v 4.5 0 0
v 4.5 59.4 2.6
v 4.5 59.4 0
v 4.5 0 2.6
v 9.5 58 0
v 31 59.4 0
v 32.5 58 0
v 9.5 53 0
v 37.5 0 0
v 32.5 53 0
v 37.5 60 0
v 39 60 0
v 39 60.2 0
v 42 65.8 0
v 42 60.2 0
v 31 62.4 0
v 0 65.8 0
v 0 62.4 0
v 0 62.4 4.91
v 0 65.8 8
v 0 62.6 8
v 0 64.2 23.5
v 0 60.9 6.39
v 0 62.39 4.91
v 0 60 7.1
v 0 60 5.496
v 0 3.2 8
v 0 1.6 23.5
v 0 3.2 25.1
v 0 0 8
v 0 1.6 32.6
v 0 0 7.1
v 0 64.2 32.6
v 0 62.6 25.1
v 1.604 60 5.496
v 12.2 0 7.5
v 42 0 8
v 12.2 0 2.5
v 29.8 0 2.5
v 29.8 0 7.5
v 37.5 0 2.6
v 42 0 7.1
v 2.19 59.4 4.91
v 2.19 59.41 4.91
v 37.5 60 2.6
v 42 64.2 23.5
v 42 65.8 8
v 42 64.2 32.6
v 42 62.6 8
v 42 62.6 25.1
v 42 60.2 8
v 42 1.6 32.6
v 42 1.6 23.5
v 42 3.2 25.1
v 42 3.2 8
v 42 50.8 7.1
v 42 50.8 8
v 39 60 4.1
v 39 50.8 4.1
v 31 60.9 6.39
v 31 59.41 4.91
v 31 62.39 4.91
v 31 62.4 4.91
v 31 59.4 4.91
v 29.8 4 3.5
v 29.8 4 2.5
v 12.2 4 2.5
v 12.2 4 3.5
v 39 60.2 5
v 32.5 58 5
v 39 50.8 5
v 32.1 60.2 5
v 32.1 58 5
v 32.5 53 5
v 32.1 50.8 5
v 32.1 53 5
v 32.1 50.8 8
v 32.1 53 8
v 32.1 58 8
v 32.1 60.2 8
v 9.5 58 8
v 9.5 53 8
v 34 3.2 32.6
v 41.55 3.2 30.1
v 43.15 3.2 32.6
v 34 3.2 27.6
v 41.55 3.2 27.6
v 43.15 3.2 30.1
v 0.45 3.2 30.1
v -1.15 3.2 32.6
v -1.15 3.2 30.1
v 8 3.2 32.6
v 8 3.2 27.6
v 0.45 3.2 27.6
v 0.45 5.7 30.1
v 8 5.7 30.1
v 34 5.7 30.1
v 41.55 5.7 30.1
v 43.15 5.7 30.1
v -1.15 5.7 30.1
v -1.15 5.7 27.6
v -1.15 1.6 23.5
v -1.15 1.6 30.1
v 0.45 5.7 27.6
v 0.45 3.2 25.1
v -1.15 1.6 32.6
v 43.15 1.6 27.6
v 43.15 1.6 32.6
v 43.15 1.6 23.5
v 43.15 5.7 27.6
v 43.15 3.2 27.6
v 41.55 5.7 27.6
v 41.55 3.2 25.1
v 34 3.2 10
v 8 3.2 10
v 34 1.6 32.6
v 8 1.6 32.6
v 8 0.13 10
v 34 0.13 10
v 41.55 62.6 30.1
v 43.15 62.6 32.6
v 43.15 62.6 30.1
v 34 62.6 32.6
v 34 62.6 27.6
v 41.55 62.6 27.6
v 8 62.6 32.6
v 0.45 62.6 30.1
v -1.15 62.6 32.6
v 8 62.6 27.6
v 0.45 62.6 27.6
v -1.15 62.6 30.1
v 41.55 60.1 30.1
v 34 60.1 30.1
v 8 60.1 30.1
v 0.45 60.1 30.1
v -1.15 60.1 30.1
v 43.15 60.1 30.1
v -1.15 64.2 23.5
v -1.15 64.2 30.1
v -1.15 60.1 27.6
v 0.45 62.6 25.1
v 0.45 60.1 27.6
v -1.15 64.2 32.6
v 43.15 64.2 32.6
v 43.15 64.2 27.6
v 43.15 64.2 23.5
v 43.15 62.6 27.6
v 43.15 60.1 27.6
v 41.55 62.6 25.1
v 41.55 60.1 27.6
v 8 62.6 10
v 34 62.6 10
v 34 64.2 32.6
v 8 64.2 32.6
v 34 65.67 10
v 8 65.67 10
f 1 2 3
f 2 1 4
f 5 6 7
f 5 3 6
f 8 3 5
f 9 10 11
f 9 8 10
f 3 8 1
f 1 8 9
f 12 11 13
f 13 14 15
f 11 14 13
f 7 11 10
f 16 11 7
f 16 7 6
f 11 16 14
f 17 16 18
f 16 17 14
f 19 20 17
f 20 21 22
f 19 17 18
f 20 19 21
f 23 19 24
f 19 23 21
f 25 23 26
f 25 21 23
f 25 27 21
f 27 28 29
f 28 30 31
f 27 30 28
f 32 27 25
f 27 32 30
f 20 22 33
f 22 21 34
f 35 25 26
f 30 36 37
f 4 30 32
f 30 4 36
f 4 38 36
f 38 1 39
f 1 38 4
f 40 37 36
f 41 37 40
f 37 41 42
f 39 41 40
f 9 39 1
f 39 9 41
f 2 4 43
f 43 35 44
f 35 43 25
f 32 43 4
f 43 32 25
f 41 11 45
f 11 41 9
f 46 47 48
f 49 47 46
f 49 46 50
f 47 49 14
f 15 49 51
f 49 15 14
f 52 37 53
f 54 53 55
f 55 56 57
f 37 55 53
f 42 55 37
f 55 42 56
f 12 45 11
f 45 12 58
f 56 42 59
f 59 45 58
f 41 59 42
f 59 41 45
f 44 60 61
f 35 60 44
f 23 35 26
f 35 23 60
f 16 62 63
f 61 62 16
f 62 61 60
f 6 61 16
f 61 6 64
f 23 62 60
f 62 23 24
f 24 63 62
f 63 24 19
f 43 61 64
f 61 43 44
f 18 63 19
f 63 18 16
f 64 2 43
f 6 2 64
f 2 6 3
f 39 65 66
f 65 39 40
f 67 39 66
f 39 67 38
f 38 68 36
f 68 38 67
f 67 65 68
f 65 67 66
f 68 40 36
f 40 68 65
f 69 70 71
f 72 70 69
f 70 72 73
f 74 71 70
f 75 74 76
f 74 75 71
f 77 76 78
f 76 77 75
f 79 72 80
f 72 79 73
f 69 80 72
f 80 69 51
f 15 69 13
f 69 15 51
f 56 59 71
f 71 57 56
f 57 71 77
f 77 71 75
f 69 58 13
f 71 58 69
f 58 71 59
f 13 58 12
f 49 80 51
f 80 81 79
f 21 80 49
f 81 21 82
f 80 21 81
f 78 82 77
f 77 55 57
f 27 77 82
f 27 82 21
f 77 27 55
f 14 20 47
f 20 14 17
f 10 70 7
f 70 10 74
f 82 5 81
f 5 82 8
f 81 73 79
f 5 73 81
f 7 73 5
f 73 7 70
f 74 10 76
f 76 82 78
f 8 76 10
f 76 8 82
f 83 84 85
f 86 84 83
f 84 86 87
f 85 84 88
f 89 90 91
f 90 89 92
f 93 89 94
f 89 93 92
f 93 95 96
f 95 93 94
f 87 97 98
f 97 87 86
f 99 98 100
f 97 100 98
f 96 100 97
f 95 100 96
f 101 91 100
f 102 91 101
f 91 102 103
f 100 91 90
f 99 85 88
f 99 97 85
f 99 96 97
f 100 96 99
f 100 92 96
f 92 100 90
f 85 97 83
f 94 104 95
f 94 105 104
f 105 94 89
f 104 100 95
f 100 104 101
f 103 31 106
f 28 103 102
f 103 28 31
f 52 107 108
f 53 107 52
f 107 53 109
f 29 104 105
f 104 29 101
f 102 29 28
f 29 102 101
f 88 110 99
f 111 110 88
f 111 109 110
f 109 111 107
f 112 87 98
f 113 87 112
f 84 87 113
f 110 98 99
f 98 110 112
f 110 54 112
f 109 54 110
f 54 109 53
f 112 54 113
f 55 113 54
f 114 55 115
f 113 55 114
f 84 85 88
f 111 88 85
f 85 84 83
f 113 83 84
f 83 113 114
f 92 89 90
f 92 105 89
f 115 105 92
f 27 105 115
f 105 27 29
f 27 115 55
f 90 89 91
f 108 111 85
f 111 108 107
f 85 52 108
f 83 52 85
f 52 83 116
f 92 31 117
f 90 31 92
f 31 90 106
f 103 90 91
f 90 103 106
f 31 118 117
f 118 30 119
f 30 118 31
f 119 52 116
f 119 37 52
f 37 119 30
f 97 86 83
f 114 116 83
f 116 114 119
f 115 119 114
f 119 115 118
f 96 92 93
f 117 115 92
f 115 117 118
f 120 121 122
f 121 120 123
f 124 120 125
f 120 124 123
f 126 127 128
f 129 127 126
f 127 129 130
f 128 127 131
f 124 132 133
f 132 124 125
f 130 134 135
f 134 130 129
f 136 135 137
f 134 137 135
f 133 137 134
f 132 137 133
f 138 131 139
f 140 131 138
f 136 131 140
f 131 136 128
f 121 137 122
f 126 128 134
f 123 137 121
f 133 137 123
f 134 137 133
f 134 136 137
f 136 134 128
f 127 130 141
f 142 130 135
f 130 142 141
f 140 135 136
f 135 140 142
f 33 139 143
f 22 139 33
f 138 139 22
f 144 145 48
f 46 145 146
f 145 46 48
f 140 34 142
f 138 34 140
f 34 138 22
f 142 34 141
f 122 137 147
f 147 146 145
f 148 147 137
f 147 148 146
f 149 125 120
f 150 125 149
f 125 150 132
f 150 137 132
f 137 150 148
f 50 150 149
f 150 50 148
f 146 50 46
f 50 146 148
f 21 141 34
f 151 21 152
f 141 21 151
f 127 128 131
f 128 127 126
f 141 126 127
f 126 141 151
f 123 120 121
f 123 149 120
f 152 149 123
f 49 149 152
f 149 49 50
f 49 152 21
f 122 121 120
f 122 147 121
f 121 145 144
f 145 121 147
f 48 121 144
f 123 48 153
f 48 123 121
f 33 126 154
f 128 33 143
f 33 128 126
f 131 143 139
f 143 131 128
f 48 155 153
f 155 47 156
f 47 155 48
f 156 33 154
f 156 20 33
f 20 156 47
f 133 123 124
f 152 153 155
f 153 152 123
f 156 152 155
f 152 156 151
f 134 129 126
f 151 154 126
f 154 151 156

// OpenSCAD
/*
Generic Action Camera Adapter for 3DR Solo
Copyright (C) 2016 - 2017  Hugh Eaves

This program is free software: you can redistribute it and/or modify
it under the terms of the GNU General Public License as published by
the Free Software Foundation, either version 3 of the License, or
(at your option) any later version.

This program is distributed in the hope that it will be useful,
but WITHOUT ANY WARRANTY; without even the implied warranty of
MERCHANTABILITY or FITNESS FOR A PARTICULAR PURPOSE.  See the
GNU General Public License for more details.

You should have received a copy of the GNU General Public License
along with this program.  If not, see <http://www.gnu.org/licenses/>.
*/

/************************************************
 * PART SELECTION
 ************************************************/

// Select the part you would like to display
part = "adapter"; // [adapter:Adapter,retaining_clip:Retaining clip,back_weight:Back Weight,side_weight:Side Weight]

/********************
 * MAIN PARAMETERS *
 ********************/

// No-name SJ4000 clone
// camera_length = 59.8;
// camera_width = 40.8;
// camera_height = 25.6;

// The values below are for the GitUp Git2P

/* [Adapter Parameters] */
// Length of camera body (side to side)
camera_length = 59.4; // [57:62]
// Width of camera body (top to bottom)
camera_width = 41.1; // [38:42]
// Height of camera body (front to back)
camera_height = 19.6; // [15:40]

// Adapter arm bump size (How far out the "bumps" protrude on the ends of the arms)
adapter_arm_bump_size = 2.5; // [1:5]

/* [Back Weight Parameters] */
// The length of the counterbalance weight on the back of the camera. Larger values make it heavier.
back_weight_length = 29; // [10:40]

// The offset of the weight on the back of the gimbal. Values greater than zero move the weight to the outer side of the gimbal
back_weight_offset = 0; // [0:20]

/* [Side Weight Parameters] */
// The thickness of the side weight, thicker is heavier
side_weight_thickness = 4; // [4:8]

// The length of the side weight, longer is heavier
side_weight_length = 10; // [9:17]

/********************
 * OTHER PARAMETERS *
 ********************/
/* [Hidden] */

/* How much to shift the camera to the right to avoid the curved protrusion from the pitch motor housing */
camera_offset = 3.2;

/* Dimensions of the base of the camera adapter, so that it is a nice snug fit inside the 3DR gimbal mount */
base_height = 8; // (thickness) thick enough to clear the GoPro plug in the back
base_width = 42;
base_length = 60;

/* Dimensions of the small bracket that holds the camera adapter to the gimbal mount */
bracket_width = 9;
bracket_depth = 9.5;
bracket_thickness = 3;
bracket_radius = 2;

/* Typical values for M2 cap-head screws */
screw_thread_diameter = 2.5;
screw_head_diameter = 5;
screw_head_height = 3;

/* Dimensions of the "stud" that the 3DR balancing weights attach to */
stud_height = 2.5;
stud_diameter = 6.4;
stud_hole_diameter = 2;

bottom_lip_width = 4.5;
bottom_lip_height = 2.6;

// cutout for GoPro plug
plug_thickness = 5;
plug_width = 23;
plug_offset = 55.5 - (plug_thickness / 2);

// cutout for right side wall of "gimbal bracket"
side_wall_length = 31;
side_wall_height = 6.4;
side_wall_width = 3;
side_wall_offset = 59.4;

// height of hook on bottom left of "gimbal bracket"
hook_width = 17.6;
hook_height = 2.5; // distance from bottom
hook_length = 4;
hook_thickness = 1;

// width of protrusion on front of "pitch motor"
motor_protrusion_width = 20;

// thickness / length of camera retaining clips
clip_thickness = 1.6;
right_clip_opening_width = 26;
// left_clip_opening_width = motor_protrusion_width;
left_clip_opening_width = right_clip_opening_width;

x_midpoint = base_width / 2;
main_length = camera_length + camera_offset * 2;
camera_gap = (base_width - camera_width) / 2;

camera_height_adjustment = 0;

// more facets for smaller holes
$fn = 16;

module lip_cutout() {
  cube([bottom_lip_width, base_length, bottom_lip_height]);
  translate([0, 0, bottom_lip_height])
    mirror([1, -1, 0])
      wedge(base_length, bottom_lip_width, bottom_lip_width, false, false);
}


module side_wall_cutout() {
  translate([0, side_wall_offset, 0]) {
    cutout_base_height = side_wall_height - (side_wall_width / 2);
    cube([side_wall_length, side_wall_width, cutout_base_height + 0.01]);
    translate([0, 0, cutout_base_height])
      prism(side_wall_length, side_wall_width, side_wall_width / 2 - 0.01);
  }
}

module hook_cutout() {
  translate([x_midpoint - hook_width / 2, 0, hook_height]) {
    cube([hook_width, hook_length, hook_thickness]);
    translate([0, 0, hook_thickness])
      wedge(hook_width, hook_length, hook_length, false);
  }
}

module bracket_cutout() {
  bracket_clearance = 0.4;
  adj_bracket_width = bracket_width + bracket_clearance;
  adj_bracket_depth = bracket_depth + bracket_clearance;
  translate([base_width - bracket_depth, base_length + bracket_clearance / 2 - adj_bracket_width, 0]) {
    translate([-bracket_clearance, 0, base_height - bracket_thickness])
      cube([adj_bracket_depth, adj_bracket_width, bracket_thickness + 5]);
    translate([bracket_depth - bracket_thickness, 0, 0])
      cube([bracket_depth, adj_bracket_width, base_height]);
  }

}

module clip_corner(length) {

  cube([clip_thickness, length + clip_thickness, length]);
  wedge(clip_thickness, length + clip_thickness, length + clip_thickness, false, true);

}


module clip(length) {
  cube([base_width, clip_thickness, camera_height]);
  translate([-clip_thickness + camera_gap, 0, camera_height])
    cube([camera_width + clip_thickness * 2, clip_thickness, length * 2 + camera_height_adjustment]);
  translate([-clip_thickness + camera_gap, clip_thickness, camera_height + camera_height_adjustment])
    mirror([0, 1, -1])
      prism(camera_width + clip_thickness * 2, length * 2, length);
  //   cube([camera_width+clip_thickness*2, length + clip_thickness, clip_thickness ]);
  wedge(base_width, camera_offset - clip_thickness, camera_height + length * 2 + camera_height_adjustment, true, false);
  translate([0, 0, camera_height + adapter_arm_bump_size + camera_height_adjustment - length]) {
    translate([-clip_thickness + camera_gap, 0, 0])
      clip_corner(length);
    translate([base_width - camera_gap, 0, 0])
      clip_corner(length);
  }
}

module left_clip() {
  translate([0, camera_offset - clip_thickness, base_height]) {
    difference() {
      clip(adapter_arm_bump_size);
      translate([x_midpoint - left_clip_opening_width / 2, -clip_thickness, 2])
        cube([left_clip_opening_width, adapter_arm_bump_size + clip_thickness * 2, camera_height + adapter_arm_bump_size * 2]);
    }
  }
}

module right_clip() {
  translate([0, camera_length + camera_offset + clip_thickness, base_height]) {
    mirror([0, 1, 0])
      difference() {
        clip(adapter_arm_bump_size);
        translate([x_midpoint - right_clip_opening_width / 2, -clip_thickness, 2])
          cube([right_clip_opening_width, adapter_arm_bump_size + clip_thickness * 2, camera_height + adapter_arm_bump_size * 2]);
      }
  }
}

module prism(x, y, z, upside_down) {
  translate([0, y / 2, 0]) {
    wedge(x, y / 2, z, true, upside_down);
    wedge(x, y / 2, z, false, upside_down);
  }
}

module wedge(x, y, z, reverse, upside_down) {
  ly = reverse ? -y : y;
  lz = upside_down ? -z : z;
  polyhedron(points = [
    [0, 0, 0],
    [x, 0, 0],
    [x, ly, 0],
    [0, ly, 0],
    [0, 0, lz],
    [x, 0, lz]
  ], faces = [
    [0, 1, 2, 3],
    [5, 4, 3, 2],
    [0, 4, 5, 1],
    [0, 3, 4],
    [5, 2, 1]
  ]);
}

module weight_stud() {
  difference() {
    cylinder(d = stud_diameter - 0.4, h = stud_height, $fn = 32);
    cylinder(d = stud_hole_diameter, h = stud_height, $fn = 16);
  }
}


/********************************************
 * Top level function to render the adapter
 ********************************************/
module adapter() {

  difference() {
    cube([base_width, main_length, base_height]);

    lip_cutout();

    translate([base_width, 0, 0])
      mirror([-1, 0, 0])
        lip_cutout();

    side_wall_cutout();

    translate([x_midpoint - plug_width / 2, plug_offset, 0])
      cube([plug_width, plug_thickness, base_height]);

    hook_cutout();

    bracket_cutout();
  }

  left_clip();
  right_clip();

}

/********************************************
 * Top level function to render the retaining clip
 ********************************************/
module retaining_clip() {
  bracket_inside_height = 11.4 + base_height - bracket_thickness;

  difference() {
    union() {
      hull() {
        cube([bracket_width, bracket_thickness, bracket_depth + bracket_thickness - bracket_radius]);
        cube([1, bracket_thickness, bracket_depth + bracket_thickness]);
        translate([bracket_width - bracket_radius, 0, bracket_depth + bracket_thickness - bracket_radius])
          mirror([0, -1, 1])
            cylinder(r = bracket_radius, h = bracket_thickness);
      }
      translate([0, bracket_inside_height + bracket_thickness, 0])
        cube([bracket_width, bracket_thickness, bracket_depth + bracket_thickness]);
      translate([0, bracket_thickness, 0])
        cube([bracket_width, bracket_inside_height, bracket_thickness * 2]);
    }

    translate([bracket_width - 3, bracket_thickness, bracket_thickness - 0.2])
      cube([2, bracket_inside_height, bracket_depth]);
    translate([bracket_width - 3.6, 0, bracket_depth + bracket_thickness - 2.8])
      mirror([0, -1, 1]) {
        translate([0, 0, -bracket_thickness / 2])
          cylinder(d = 4, h = bracket_thickness);
        translate([0, 0, bracket_thickness / 2])
          cylinder(d = 2, h = bracket_thickness);
      }
  }
}

/********************************************
 * Top level function to render the back / counterbalance weight
 ********************************************/
module back_weight() {
  thickness = 2;
  length = 57.8;
  width = 34;
  weight_thickness = 100;

  intersection() {
    difference() {
      union() {
        cube([length, width, thickness]);
        translate([back_weight_offset, 0, -weight_thickness])
          cube([back_weight_length, width, weight_thickness]);
        translate([12, 0, thickness])
          cube([3, width, 3.4]);
        translate([33.6, 0, thickness])
          cube([3, width, 4]);
        translate([54.8, 8, thickness])
          cube([3, width - 8, 4]);

        translate([36, 0, 0]) {
          translate([4.5, 18, -2])
            cylinder(d = 5, h = 2);
          translate([16.5, 6.75, -2])
            cylinder(d = 5, h = 2);
          translate([13.5, 27, -2])
            cylinder(d = 5, h = 2);
        }

      }
      translate([36, 0, 0]) {
        translate([4.5, 18, -90])
          cylinder(d = screw_thread_diameter, h = 100);
        translate([16.5, 6.75, -90])
          cylinder(d = screw_thread_diameter, h = 100);
        translate([13.5, 27, -90])
          cylinder(d = screw_thread_diameter, h = 100);
      }

    }
    mirror([-1, 0, 1])
      translate([26, width / 2, 0]) {
        cylinder(d = 77, h = 14, $fn = 64);
        translate([0, 0, 14])
          cylinder(d = 70, h = 16, $fn = 64);
        translate([0, 0, 30])
          cylinder(d = 77, h = 100, $fn = 64);
      }
  }
}

module curve_cutout(beam_curve_diameter, beam_thickness) {
  difference() {
    cylinder(d = beam_curve_diameter, h = 100, $fn = 64);
    cylinder(d = beam_curve_diameter - (beam_thickness * 2), h = 100, $fn = 64);
  }
}

/********************************************
 * Top level function to render the side weight
 ********************************************/
module side_weight() {

  side_weight_width = 2;

  beam_curve_diameter = 34;
  beam_thickness = 1.2;
  beam_height = 4;
  beam_width = 5.7;
  beam_length = beam_curve_diameter / 2;

  bracket_length = beam_length;
  bracket_width = beam_width + side_weight_width + beam_thickness;
  bracket_height = beam_height + side_weight_thickness;
  bracket_depth = 3;

  difference() {
    union() {
      difference() {
        cube([bracket_length, bracket_width, bracket_height]);

        translate([0, beam_curve_diameter / 2 + side_weight_width, side_weight_thickness])
          curve_cutout(beam_curve_diameter, beam_thickness);

        translate([bracket_length - screw_head_diameter / 2 - 1, bracket_width / 2 - 1, 0]) {

          cylinder(d = screw_head_diameter, h = screw_head_height);
          cylinder(d = screw_thread_diameter, h = bracket_height);
        }
      }
      translate([-side_weight_length, 0, 0])
        difference() {
          cube([side_weight_length, bracket_width, bracket_height]);

          translate([0, side_weight_width, side_weight_thickness])
            cube([side_weight_length, beam_thickness, 100]);
        }
    }
  }
}

// Call the top level rendering function based on "part"
if (part == "adapter") {
  adapter();
} else if (part == "back_weight") {
  back_weight();
} else if (part == "retaining_clip") {
  retaining_clip();
} else if (part == "side_weight") {
  side_weight();
  translate([0, 20, 0])
    mirror([1, 0, 0])
      side_weight();
}
